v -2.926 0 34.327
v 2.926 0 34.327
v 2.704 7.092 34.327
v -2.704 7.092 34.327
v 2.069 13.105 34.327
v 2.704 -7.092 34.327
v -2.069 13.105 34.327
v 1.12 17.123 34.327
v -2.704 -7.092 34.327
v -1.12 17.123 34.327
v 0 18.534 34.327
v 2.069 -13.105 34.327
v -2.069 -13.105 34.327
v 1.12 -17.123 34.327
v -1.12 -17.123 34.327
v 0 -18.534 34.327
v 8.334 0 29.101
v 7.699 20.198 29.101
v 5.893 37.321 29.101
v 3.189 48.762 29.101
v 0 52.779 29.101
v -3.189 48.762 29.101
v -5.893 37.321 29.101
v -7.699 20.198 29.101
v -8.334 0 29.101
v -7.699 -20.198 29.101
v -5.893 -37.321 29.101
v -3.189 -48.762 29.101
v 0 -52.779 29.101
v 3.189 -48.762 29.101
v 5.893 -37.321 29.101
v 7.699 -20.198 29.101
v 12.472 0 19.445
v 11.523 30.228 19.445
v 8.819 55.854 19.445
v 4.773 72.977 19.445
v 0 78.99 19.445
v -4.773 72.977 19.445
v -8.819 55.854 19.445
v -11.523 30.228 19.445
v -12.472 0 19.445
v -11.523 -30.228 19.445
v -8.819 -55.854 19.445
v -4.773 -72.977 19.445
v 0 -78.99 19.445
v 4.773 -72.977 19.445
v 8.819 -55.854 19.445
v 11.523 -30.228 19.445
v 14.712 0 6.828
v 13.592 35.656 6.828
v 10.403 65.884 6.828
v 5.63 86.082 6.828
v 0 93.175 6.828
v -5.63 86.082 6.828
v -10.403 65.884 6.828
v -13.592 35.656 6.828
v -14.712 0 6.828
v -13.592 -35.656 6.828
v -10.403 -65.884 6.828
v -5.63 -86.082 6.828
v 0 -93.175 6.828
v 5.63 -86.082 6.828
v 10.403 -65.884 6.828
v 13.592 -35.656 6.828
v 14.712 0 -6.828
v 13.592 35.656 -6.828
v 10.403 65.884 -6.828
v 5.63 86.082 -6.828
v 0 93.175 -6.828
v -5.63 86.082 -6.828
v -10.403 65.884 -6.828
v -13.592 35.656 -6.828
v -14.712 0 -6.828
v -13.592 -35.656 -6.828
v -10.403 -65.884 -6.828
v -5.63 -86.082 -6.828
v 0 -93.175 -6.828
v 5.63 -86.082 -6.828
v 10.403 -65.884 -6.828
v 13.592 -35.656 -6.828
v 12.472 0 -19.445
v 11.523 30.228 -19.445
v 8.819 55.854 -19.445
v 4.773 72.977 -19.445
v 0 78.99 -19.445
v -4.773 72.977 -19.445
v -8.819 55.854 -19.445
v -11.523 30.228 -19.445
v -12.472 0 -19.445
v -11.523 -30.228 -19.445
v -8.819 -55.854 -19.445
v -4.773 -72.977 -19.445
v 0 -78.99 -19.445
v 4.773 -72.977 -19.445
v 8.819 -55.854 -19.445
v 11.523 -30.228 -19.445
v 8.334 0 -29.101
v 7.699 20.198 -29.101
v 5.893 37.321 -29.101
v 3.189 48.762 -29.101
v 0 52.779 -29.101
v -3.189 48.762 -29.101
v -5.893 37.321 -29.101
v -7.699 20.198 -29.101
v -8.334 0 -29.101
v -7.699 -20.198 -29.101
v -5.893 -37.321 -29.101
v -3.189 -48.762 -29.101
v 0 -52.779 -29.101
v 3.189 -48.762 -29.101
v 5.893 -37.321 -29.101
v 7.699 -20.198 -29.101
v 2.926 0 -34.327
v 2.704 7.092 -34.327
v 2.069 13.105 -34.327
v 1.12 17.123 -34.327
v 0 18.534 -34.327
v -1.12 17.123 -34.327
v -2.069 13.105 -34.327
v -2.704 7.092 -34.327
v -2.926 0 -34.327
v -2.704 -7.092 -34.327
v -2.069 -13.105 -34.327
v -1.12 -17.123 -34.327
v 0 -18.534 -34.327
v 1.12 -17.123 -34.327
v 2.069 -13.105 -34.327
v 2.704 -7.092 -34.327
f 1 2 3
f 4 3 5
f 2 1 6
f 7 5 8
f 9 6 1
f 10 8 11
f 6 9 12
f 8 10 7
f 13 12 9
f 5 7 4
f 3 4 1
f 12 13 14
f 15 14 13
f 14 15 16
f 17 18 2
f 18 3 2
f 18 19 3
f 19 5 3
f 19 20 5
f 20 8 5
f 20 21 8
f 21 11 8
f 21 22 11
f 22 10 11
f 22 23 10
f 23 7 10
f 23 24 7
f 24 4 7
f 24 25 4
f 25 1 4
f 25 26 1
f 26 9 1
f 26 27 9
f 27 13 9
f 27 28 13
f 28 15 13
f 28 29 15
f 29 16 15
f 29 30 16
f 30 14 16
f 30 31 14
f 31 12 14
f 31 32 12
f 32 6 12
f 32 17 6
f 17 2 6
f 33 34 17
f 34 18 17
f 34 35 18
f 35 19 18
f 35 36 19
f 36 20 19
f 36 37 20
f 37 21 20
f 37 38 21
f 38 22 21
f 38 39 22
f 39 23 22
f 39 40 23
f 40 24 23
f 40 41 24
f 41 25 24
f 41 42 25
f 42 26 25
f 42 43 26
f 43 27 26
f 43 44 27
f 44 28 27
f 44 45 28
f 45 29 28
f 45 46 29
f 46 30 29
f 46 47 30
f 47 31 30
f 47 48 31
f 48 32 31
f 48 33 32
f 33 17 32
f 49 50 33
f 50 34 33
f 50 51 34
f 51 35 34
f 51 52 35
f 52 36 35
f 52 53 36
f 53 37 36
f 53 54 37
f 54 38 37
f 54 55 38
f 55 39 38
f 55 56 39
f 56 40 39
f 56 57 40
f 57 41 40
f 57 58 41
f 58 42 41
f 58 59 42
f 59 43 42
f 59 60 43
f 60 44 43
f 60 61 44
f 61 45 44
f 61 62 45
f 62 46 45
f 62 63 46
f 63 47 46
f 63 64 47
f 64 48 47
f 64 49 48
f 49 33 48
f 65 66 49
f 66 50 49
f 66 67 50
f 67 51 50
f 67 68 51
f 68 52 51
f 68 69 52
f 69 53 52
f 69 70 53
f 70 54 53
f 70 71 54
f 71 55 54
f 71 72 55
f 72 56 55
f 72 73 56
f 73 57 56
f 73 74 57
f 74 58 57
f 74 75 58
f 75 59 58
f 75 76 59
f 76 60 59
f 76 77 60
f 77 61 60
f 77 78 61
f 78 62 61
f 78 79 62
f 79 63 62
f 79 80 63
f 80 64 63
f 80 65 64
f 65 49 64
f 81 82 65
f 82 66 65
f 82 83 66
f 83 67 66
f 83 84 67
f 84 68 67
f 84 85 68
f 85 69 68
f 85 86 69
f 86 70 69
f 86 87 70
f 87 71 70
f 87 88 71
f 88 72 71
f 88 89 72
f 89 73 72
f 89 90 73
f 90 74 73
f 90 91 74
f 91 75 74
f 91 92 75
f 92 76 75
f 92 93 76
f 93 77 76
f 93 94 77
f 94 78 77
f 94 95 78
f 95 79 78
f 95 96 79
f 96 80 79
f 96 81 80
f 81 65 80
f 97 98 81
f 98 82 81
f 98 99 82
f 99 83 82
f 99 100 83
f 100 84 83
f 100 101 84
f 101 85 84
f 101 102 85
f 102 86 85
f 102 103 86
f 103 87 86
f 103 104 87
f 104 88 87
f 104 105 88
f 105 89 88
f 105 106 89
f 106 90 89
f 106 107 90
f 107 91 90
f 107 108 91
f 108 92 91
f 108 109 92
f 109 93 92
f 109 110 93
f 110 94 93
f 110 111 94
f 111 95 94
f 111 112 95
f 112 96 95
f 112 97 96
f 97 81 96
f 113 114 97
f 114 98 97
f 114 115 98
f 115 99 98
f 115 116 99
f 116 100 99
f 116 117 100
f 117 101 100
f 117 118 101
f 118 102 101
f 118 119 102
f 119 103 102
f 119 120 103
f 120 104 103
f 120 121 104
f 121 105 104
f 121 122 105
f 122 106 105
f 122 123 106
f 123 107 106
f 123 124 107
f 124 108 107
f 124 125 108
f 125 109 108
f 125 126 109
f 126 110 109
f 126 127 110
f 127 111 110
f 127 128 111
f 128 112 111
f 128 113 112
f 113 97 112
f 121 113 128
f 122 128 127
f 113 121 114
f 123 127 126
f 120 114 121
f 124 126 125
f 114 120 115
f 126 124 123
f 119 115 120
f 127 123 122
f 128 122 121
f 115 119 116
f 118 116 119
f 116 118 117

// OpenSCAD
// Generated by SolidPython 1.0.1 on 2020-07-29 00:46:46


scale(v = [3, 19, 7]) {
	sphere(r = 5);
}
/***********************************************
*********      SolidPython code:      **********
************************************************
 
# import packages: SolidPython
from solid import *
from solid.utils import *
from itertools import chain, combinations, permutations


class Resize:

    def __init__(self, scad_file):
        self.scad_file = scad_file
        #self.scad_file = import_scad(scad_file)
        # cone/cylinder param:
        self.r1 = 0
        self.r2 = 0
        self.h = 0
        # rectangular prism param:
        self.w = 0
        self.l = 0
        # ellipse param:
        self.r = 0

    # import OpenScad code (file name corresponds to shape)


    # classify shape + parameters
    def assign(self, param1, param2, param3):
        if self.scad_file == 'cone.scad':
            self.r1 = param1
            self.r2 = param2
            self.h = param3
        elif self.scad_file == 'cylinder.scad':
            self.r1 = param1
            self.r2 = param2
            self.h = param3
        elif self.scad_file == 'rectangularPrism.scad':
            self.h = param1
            self.l = param2
            self.w = param3
        else:
            self.r = param1
            self.h = param2

    # resize parameters
    def iterate(self):
        x = range(3, 20, 2)
        i = 1
        if self.scad_file == 'cone.scad':
            tempList = list(permutations(x, 2))
            for temp in tempList:
                param1 = temp[0]
                param2 = temp[1]
                filepath = 'produced_scad_files/' + 'cone' + str(param1) + '_' + str(param2) + '_' + '.scad'
                scad_render_to_file(cylinder(h=param1, r1=param2, r2=0), filepath)

        elif self.scad_file == 'cylinder.scad':
            tempList = list(permutations(x, 3))
            for temp in tempList:
                param1 = temp[0]
                param2 = temp[1]
                filepath = 'produced_scad_files/' + 'cylinder' + str(param1) + '_' + str(param2) + '_' + '.scad'
                scad_render_to_file(cylinder(h=param1, r1=param2, r2=param2), filepath)

        elif self.scad_file == 'rectangularPrism.scad':
            tempList = list(permutations(x, 3))
            for temp in tempList:
                param1 = temp[0]
                param2 = temp[1]
                param3 = temp[2]
                filepath = 'produced_scad_files/' + 'rectangularPrism' + str(param1) + '_' + str(param2) + '_' + str(
                    param3) + '.scad'
                scad_render_to_file(cube(size=(param1, param2, param3)), filepath)

        elif self.scad_file == 'ellipse.scad':
            tempList = list(permutations(x, 4))
            for temp in tempList:
                param1 = temp[0]
                param2 = temp[1]
                param3 = temp[2]
                param4 = temp[3]
                filepath = 'produced_scad_files/' + 'ellipse' + str(param1) + '_' + str(param2) + '_' + str(param3) + '_' + str(param4) + '.scad'
                scad_render_to_file(scale([param1, param2, param3])(sphere(r=param4)), filepath)

    def render_to_scadfile(self):
        scad_render_to_file(scad, 'example.scad') 
 
************************************************/
